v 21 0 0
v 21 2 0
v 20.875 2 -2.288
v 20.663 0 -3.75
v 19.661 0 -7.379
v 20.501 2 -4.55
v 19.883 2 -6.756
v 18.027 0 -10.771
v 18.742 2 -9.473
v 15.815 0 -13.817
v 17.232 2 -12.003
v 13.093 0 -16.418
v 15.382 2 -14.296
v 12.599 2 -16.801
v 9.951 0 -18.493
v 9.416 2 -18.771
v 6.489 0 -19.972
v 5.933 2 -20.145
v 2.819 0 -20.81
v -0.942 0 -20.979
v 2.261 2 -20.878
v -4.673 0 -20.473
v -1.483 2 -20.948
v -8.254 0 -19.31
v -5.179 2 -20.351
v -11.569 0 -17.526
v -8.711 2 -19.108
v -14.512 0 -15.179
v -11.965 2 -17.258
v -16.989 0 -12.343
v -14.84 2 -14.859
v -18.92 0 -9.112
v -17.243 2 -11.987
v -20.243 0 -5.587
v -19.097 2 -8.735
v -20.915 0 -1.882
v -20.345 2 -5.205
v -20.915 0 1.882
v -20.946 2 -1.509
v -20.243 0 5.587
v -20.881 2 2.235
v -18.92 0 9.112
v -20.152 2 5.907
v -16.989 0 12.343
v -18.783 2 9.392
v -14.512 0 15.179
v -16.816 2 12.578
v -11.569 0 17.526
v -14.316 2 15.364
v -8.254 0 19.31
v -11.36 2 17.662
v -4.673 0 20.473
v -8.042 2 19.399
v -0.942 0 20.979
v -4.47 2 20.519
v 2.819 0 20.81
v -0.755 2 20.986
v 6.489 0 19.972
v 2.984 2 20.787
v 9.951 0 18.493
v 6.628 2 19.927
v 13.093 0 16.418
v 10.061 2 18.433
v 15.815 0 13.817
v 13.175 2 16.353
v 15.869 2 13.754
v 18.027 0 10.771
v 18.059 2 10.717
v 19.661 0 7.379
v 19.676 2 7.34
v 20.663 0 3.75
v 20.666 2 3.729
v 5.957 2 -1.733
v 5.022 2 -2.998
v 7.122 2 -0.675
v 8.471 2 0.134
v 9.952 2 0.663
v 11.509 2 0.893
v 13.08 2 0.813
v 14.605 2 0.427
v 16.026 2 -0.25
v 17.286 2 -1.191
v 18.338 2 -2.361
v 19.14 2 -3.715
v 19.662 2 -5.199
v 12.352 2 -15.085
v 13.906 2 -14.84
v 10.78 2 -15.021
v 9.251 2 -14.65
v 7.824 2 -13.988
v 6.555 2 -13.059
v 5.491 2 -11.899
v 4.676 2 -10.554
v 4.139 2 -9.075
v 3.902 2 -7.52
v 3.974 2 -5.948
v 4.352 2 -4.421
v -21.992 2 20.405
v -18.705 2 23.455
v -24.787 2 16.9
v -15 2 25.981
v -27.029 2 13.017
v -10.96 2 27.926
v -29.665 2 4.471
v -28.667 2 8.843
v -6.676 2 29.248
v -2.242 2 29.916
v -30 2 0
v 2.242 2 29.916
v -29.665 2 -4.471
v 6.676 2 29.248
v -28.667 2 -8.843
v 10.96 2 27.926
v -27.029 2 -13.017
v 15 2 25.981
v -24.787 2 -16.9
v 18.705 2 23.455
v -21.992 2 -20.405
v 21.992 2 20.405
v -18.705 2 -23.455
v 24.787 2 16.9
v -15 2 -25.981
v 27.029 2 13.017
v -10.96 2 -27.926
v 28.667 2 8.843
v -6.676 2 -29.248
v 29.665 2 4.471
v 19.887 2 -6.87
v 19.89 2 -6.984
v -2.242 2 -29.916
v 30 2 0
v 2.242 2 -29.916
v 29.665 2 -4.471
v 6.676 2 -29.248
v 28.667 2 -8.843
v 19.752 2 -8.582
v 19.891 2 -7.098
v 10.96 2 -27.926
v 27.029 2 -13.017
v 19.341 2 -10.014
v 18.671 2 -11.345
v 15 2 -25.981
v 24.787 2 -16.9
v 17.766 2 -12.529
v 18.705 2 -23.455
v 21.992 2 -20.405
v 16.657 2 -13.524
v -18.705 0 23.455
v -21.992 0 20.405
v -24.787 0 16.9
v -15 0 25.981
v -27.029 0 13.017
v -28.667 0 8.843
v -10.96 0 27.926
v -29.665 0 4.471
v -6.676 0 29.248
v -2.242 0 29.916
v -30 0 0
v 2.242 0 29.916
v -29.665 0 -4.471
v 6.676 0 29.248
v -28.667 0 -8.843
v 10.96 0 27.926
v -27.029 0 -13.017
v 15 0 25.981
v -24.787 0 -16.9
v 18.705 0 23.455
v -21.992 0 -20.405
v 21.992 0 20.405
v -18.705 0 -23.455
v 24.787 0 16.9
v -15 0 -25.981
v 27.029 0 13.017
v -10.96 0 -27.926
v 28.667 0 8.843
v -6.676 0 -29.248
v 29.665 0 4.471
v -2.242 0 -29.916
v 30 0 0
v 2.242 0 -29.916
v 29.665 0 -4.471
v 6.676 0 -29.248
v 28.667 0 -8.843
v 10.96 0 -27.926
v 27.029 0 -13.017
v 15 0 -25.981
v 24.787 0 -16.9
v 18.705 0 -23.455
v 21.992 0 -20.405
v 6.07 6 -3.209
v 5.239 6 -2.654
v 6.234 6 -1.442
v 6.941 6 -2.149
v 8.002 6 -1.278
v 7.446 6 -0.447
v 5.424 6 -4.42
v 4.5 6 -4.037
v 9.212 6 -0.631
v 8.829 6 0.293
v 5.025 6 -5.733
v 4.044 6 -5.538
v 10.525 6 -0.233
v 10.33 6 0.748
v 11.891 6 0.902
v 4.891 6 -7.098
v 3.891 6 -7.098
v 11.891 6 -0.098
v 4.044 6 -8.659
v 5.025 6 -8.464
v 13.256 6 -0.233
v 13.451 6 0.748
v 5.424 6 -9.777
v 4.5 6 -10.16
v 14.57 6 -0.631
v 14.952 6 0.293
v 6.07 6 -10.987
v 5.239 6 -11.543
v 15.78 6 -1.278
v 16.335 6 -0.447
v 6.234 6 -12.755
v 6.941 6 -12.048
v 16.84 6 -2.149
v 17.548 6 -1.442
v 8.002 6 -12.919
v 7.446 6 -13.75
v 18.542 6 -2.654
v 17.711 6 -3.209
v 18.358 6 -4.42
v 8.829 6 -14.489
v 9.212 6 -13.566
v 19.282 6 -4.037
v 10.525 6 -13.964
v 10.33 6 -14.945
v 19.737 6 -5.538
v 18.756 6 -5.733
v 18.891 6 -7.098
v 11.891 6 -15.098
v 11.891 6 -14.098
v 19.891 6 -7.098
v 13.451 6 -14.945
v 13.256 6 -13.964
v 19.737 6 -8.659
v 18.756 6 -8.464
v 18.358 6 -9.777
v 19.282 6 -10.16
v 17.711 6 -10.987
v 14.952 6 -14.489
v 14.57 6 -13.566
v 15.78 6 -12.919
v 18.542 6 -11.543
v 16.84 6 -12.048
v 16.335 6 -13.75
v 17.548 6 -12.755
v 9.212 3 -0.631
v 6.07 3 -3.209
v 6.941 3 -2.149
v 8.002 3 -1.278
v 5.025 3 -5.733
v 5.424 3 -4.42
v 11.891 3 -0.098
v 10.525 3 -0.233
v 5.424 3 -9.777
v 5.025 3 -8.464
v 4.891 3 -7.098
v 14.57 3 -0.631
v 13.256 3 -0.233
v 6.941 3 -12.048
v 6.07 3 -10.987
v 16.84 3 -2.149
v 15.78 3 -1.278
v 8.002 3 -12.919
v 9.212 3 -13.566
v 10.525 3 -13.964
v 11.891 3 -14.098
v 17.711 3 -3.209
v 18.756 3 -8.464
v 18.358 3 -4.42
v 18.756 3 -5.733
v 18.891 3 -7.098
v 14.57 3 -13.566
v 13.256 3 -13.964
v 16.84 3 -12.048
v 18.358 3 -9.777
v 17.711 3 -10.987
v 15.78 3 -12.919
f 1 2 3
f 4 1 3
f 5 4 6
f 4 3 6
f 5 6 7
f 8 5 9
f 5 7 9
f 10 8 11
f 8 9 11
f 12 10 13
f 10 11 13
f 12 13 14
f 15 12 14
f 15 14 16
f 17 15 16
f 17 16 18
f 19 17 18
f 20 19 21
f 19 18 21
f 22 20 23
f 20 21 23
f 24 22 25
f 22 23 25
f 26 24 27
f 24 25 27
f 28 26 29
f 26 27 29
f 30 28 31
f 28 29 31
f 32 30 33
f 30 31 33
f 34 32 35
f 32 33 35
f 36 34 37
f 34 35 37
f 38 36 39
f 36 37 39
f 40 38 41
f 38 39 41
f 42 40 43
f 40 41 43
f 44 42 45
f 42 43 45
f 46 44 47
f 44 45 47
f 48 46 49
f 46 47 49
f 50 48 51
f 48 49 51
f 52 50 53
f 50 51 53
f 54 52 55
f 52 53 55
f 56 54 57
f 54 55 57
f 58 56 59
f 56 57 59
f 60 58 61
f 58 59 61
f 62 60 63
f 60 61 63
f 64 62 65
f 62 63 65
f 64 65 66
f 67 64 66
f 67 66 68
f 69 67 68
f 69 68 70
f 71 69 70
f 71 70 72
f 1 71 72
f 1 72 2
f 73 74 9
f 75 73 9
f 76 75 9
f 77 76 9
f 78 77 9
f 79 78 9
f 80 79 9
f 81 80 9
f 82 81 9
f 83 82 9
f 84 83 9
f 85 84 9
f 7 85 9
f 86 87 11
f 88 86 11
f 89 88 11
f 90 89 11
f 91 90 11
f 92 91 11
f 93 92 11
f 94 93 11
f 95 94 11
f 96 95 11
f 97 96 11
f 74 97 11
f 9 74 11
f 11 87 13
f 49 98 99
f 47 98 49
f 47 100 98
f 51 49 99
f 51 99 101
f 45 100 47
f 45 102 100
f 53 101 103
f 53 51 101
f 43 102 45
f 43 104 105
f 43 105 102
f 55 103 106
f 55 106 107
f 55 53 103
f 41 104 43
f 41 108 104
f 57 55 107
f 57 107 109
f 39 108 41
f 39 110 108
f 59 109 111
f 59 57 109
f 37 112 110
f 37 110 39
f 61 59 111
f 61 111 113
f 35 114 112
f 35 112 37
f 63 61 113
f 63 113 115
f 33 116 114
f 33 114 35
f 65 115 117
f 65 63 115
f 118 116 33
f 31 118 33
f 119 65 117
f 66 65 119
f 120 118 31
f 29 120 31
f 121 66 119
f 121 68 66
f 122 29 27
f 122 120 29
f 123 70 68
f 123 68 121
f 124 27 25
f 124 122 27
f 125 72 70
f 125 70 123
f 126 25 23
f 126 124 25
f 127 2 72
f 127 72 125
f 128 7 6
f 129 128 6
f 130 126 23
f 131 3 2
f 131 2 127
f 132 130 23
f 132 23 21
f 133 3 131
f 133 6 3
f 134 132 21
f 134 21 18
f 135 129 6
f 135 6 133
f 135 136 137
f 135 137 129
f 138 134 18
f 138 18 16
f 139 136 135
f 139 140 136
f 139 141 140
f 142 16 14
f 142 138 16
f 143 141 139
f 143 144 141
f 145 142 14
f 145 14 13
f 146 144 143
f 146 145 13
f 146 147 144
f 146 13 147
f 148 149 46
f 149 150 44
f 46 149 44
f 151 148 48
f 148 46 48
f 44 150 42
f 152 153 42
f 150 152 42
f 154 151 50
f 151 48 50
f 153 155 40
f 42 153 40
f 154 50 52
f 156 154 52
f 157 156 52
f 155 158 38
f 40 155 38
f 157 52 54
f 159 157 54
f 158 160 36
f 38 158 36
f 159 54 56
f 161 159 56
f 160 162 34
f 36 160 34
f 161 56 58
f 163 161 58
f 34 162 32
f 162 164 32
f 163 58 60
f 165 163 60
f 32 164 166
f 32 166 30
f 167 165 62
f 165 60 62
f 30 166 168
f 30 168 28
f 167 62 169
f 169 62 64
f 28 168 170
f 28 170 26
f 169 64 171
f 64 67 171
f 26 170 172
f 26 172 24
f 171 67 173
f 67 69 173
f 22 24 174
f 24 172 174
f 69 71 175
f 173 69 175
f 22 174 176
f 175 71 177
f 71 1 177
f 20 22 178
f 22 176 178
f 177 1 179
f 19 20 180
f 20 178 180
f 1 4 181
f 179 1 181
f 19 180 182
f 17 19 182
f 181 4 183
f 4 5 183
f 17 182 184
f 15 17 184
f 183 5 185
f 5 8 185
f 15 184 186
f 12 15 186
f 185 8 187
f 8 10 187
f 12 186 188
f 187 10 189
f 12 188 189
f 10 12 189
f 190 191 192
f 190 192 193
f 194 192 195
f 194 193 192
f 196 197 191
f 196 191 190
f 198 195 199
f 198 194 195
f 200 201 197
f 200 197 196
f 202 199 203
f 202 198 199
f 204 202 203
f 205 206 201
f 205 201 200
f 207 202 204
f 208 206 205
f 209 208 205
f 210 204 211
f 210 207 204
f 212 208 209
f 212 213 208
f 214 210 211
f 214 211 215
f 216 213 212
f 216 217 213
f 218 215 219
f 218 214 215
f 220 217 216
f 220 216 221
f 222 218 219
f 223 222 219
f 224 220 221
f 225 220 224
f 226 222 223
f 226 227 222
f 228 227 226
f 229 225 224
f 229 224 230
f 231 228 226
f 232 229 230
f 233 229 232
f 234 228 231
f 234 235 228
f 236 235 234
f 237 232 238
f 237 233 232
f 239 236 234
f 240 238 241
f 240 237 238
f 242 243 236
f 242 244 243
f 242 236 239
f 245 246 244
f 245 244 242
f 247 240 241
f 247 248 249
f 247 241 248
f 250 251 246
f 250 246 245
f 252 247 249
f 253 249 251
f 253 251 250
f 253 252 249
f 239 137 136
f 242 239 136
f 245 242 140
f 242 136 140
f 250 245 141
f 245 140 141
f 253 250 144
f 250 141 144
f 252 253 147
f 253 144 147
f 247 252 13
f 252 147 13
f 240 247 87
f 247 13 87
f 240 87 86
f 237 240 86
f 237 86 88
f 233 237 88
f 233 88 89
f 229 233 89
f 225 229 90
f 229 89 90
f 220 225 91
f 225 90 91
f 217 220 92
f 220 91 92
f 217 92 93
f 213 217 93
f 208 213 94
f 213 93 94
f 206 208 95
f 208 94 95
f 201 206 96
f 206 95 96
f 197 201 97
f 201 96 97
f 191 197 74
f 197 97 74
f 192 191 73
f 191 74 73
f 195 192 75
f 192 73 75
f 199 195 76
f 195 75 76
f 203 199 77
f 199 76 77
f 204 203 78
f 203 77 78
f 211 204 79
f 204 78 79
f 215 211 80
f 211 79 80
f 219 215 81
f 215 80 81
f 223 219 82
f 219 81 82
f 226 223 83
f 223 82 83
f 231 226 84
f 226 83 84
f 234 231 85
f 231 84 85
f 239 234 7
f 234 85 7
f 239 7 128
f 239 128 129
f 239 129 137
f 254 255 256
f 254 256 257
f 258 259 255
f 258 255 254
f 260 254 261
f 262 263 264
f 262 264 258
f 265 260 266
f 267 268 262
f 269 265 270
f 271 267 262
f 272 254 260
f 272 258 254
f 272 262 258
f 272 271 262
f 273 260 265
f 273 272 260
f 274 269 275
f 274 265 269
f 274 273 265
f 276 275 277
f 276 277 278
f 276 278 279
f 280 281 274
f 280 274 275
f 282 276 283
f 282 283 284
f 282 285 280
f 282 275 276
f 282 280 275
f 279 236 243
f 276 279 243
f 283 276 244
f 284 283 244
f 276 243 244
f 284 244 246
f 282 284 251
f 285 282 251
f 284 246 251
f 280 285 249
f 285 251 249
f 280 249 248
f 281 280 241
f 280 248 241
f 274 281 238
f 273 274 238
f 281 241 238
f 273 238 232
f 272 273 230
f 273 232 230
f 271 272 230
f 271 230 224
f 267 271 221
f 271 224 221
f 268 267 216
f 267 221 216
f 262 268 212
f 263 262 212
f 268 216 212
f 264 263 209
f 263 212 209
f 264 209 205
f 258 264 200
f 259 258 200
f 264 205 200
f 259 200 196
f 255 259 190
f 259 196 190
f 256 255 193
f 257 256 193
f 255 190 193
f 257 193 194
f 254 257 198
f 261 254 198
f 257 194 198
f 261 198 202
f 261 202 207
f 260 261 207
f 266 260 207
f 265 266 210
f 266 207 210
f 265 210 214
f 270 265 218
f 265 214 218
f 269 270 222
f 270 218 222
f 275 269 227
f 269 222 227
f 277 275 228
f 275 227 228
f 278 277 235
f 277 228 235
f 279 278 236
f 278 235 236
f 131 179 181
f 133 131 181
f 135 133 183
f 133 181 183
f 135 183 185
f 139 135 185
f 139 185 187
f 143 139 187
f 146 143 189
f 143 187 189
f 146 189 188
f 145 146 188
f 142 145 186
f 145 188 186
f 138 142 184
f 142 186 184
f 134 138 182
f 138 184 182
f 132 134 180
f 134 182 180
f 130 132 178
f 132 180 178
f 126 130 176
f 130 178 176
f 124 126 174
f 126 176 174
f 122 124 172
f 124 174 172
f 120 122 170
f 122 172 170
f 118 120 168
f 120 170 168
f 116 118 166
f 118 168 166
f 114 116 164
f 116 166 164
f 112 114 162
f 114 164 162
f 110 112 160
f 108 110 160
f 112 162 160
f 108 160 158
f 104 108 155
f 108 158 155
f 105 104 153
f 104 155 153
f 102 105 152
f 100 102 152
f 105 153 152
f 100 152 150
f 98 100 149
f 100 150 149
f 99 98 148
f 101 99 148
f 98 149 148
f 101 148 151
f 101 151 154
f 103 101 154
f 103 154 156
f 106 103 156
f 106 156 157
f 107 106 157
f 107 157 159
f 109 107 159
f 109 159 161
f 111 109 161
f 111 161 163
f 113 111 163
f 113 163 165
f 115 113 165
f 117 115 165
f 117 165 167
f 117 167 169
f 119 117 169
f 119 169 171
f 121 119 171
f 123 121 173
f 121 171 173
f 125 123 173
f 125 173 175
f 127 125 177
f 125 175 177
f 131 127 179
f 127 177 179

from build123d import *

# Parameters (mm, degrees)
SKETCH1_R           = 30
BOSS_EXTRUDE1_DEPTH = 2
SKETCH2_R           = 21
CUT_EXTRUDE1_DEPTH  = 2
SKETCH3_R           = 8
BOSS_EXTRUDE2_DEPTH = 4
SKETCH4_R           = 7
CUT_EXTRUDE2_DEPTH  = 3


with BuildPart() as part:
    # Sketch1 → Boss-Extrude1 (new body)
    with BuildSketch(Plane(origin=(0, 0, 0), x_dir=(1, 0, 0), z_dir=(0, 1, 0))):
        Circle(SKETCH1_R)
    extrude(amount=BOSS_EXTRUDE1_DEPTH)

    # Sketch2 → Cut-Extrude1 (cut)
    with BuildSketch(Plane(origin=(0, 2, 0), x_dir=(1, 0, 0), z_dir=(0, 1, 0))):
        Circle(SKETCH2_R)
    extrude(amount=-CUT_EXTRUDE1_DEPTH, mode=Mode.SUBTRACT)

    # Sketch3 → Boss-Extrude2 (add)
    with BuildSketch(Plane(origin=(0, 2, 0), x_dir=(1, 0, 0), z_dir=(0, 1, 0))):
        with Locations((11.890730665, 7.098367026)):
            Circle(SKETCH3_R)
    extrude(amount=BOSS_EXTRUDE2_DEPTH)

    # Sketch4 → Cut-Extrude2 (cut)
    with BuildSketch(Plane(origin=(0, 6, 0), x_dir=(1, 0, 0), z_dir=(0, 1, 0))):
        with Locations((11.890730665, 7.098367026)):
            Circle(SKETCH4_R)
    extrude(amount=-CUT_EXTRUDE2_DEPTH, mode=Mode.SUBTRACT)


solid = part.part
